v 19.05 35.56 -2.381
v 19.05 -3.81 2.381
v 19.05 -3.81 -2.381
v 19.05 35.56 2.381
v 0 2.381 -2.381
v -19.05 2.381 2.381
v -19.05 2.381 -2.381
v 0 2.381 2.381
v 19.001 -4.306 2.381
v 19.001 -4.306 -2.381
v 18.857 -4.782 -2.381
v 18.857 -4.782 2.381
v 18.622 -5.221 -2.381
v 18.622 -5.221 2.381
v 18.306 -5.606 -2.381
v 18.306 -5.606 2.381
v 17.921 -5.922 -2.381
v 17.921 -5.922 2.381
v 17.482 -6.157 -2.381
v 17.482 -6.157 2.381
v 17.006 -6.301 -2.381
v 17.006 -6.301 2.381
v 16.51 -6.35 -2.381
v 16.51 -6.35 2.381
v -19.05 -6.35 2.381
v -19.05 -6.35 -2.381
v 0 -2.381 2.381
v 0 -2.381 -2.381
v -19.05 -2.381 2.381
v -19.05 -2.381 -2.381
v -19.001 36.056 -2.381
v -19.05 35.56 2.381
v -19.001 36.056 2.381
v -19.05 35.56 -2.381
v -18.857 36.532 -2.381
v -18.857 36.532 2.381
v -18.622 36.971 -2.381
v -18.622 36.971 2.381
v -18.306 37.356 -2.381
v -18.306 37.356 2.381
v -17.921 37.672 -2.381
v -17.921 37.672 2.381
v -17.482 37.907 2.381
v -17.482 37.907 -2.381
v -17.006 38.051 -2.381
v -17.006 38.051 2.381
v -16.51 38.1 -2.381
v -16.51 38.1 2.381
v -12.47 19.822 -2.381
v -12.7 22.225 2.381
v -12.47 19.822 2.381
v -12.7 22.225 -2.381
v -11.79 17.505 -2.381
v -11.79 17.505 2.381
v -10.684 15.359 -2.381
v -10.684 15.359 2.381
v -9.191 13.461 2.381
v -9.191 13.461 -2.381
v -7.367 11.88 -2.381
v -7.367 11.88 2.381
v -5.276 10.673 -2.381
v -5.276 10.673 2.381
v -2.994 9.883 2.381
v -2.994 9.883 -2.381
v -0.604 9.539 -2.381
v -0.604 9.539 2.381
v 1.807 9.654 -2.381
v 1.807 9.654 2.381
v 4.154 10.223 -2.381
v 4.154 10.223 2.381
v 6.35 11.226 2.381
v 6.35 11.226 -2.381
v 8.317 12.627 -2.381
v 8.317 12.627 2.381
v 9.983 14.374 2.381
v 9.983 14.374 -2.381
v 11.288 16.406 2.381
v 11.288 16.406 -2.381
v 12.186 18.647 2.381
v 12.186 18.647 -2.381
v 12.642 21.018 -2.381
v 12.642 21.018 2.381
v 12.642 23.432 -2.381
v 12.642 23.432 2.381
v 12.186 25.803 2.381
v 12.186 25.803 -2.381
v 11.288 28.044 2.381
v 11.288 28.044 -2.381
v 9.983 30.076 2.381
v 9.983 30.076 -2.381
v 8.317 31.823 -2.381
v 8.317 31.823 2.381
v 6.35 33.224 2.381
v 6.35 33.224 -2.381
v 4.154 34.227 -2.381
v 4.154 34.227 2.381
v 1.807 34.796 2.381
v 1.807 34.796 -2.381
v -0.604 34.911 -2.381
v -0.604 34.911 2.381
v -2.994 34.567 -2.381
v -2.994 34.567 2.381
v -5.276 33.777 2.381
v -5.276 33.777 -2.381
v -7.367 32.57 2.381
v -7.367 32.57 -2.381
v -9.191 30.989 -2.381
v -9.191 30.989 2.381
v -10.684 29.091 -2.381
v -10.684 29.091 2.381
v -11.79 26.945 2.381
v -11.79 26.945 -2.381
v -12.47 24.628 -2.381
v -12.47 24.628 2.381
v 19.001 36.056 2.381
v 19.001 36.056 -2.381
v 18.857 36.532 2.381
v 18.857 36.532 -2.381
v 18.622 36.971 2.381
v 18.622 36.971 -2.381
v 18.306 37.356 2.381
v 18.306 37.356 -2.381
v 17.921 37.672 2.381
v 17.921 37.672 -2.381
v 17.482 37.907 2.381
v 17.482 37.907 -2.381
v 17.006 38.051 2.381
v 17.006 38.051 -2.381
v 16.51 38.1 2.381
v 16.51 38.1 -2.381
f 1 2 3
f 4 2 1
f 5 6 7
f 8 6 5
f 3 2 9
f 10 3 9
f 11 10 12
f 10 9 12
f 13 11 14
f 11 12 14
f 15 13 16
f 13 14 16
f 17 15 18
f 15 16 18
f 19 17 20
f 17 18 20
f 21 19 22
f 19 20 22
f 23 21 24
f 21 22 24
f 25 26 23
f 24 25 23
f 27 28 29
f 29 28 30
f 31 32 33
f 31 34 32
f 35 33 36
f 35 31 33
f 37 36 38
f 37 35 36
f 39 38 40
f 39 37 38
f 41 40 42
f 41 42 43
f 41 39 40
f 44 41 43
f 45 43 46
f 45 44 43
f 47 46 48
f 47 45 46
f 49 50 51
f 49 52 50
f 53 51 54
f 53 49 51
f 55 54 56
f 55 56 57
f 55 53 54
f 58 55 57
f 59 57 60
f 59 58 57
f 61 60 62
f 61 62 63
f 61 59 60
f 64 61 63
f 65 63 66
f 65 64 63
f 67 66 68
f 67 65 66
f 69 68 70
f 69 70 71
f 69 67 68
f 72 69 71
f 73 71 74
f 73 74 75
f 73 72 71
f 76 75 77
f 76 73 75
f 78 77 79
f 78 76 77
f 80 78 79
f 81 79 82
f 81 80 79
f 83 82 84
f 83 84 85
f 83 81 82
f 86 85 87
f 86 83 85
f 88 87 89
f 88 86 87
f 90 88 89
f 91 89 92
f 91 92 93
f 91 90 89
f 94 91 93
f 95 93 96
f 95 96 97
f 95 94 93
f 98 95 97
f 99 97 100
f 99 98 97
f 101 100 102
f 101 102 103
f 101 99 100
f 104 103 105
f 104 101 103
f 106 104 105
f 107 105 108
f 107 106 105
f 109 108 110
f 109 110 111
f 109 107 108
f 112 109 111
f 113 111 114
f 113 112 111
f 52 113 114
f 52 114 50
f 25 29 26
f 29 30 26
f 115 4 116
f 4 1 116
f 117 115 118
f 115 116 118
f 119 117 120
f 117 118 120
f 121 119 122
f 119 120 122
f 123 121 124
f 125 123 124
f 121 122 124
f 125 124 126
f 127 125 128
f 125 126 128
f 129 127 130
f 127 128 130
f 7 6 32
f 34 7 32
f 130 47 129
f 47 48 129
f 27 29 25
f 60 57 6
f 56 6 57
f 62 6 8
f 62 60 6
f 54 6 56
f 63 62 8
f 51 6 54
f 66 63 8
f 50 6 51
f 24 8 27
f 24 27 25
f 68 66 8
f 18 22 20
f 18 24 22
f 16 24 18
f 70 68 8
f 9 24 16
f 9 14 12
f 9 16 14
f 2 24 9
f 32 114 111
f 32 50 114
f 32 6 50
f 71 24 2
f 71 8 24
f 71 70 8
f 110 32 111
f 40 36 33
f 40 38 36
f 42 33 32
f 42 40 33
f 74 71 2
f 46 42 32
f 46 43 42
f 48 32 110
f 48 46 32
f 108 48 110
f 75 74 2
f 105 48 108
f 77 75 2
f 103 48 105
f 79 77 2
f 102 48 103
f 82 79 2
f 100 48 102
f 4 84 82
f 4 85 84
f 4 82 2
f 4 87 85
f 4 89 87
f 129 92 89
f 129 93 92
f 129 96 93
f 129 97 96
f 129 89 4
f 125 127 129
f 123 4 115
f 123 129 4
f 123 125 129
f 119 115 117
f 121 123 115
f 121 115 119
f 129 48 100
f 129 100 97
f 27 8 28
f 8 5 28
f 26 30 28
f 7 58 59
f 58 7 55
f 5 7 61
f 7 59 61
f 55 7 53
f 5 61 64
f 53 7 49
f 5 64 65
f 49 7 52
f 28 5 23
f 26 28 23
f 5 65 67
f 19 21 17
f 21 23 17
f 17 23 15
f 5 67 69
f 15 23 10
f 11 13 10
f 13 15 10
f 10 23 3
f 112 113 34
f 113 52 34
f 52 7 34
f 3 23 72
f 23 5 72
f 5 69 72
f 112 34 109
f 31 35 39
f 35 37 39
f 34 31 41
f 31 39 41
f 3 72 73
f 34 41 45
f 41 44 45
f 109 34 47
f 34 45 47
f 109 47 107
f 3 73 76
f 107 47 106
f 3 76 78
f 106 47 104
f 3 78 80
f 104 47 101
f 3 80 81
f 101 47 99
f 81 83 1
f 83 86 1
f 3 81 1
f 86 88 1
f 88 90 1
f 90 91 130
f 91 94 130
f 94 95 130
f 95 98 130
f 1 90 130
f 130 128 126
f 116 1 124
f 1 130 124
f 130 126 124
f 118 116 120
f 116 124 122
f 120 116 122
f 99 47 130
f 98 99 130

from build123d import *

# Parameters (mm, degrees)
SKETCH1_W           = 38.1
SKETCH1_H           = 31.75
SKETCH1_R           = 12.7
BOSS_EXTRUDE1_DEPTH = 2.38125
FILLET1_R           = 2.54


with BuildPart() as part:
    # Sketch1 → Boss-Extrude1 (new, symmetric)
    # profile 1 of 2: a face of its own
    with BuildSketch(Plane.XY):
        Polygon((-19.05, 6.35), (-19.05, 2.38125), (0, 2.38125), (0, -2.38125), (-19.05, -2.38125), (-19.05, -6.35), (19.05, -6.35), (19.05, 6.35), align=None)
    # profile 2 of 2: a face of its own
    with BuildSketch(Plane.XY):
        with Locations((0, 22.225)):
            Rectangle(SKETCH1_W, SKETCH1_H)
        with Locations(Location((0, 22.225, 0), (0, 0, 180))):
            Circle(SKETCH1_R, mode=Mode.SUBTRACT)
    extrude(amount=BOSS_EXTRUDE1_DEPTH, both=True)

    # Fillet1
    fillet1_edges = [part.edges().sort_by_distance(p)[0] for p in [
        (-19.05, 38.1, 0),
        (19.05, 38.1, 0),
        (19.05, -6.35, 0),
    ]]
    fillet(fillet1_edges, radius=FILLET1_R)


solid = part.part
